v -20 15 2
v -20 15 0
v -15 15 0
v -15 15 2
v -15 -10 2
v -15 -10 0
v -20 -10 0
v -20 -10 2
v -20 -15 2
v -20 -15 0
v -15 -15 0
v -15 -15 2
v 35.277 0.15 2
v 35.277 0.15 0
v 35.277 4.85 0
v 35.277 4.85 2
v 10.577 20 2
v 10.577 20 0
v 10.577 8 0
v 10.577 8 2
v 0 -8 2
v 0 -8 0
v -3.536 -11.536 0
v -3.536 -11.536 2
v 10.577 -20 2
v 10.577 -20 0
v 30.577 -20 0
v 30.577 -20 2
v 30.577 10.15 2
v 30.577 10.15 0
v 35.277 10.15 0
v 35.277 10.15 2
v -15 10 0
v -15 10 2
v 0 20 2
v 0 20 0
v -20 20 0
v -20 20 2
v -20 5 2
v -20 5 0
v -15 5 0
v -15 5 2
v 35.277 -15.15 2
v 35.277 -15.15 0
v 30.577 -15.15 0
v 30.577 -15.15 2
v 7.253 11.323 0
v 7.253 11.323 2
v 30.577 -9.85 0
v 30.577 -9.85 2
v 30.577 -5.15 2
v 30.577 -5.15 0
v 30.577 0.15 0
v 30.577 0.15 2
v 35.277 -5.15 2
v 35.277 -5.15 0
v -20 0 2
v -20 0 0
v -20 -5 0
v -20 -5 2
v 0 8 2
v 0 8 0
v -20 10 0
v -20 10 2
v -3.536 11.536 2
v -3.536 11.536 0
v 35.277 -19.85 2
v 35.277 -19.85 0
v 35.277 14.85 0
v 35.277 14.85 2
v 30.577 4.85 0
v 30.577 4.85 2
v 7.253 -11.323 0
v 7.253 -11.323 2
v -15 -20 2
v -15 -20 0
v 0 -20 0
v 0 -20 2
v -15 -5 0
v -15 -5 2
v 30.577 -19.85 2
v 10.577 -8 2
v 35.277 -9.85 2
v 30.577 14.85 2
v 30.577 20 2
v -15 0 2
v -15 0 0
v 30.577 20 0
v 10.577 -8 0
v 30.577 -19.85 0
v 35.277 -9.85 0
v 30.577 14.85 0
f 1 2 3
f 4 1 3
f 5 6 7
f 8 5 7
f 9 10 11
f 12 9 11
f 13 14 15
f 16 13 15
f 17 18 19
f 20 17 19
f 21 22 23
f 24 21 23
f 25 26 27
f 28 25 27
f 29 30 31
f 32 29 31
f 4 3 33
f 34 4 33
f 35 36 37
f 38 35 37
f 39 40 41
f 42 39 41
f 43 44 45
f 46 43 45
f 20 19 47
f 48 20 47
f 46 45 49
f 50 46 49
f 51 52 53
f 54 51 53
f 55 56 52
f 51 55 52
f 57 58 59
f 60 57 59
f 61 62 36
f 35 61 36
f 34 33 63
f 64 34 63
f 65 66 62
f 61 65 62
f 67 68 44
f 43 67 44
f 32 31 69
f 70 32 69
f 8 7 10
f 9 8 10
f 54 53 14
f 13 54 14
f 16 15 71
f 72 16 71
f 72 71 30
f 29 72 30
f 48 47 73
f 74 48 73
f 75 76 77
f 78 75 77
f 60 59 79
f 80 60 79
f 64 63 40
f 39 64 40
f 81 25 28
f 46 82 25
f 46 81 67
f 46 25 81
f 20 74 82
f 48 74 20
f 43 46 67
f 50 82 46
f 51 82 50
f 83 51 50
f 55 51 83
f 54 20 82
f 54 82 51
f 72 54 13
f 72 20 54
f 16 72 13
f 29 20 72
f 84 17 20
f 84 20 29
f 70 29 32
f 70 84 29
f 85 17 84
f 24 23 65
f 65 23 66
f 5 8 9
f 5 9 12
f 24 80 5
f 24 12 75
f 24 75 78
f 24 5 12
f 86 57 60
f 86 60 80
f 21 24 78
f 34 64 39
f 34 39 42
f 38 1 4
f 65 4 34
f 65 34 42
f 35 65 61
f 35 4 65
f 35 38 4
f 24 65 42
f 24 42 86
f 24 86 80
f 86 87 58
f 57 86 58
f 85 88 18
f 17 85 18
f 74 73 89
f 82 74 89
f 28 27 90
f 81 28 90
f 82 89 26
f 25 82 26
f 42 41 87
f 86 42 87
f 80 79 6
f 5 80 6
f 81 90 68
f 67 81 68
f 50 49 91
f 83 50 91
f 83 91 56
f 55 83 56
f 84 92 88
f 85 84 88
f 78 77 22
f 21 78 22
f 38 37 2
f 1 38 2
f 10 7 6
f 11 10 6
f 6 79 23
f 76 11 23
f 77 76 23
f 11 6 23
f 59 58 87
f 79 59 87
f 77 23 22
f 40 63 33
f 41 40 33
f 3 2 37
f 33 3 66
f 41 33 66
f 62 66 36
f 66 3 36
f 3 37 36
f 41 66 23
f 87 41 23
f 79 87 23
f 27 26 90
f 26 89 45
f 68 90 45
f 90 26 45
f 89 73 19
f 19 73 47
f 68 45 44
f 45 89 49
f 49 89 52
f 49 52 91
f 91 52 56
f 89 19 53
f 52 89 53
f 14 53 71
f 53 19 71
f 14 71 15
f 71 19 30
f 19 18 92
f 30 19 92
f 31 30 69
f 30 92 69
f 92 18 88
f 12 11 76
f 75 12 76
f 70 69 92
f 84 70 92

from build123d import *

# Parameters (mm, degrees)
F1_DEPTH = 2


with BuildPart() as f1:
    # F0 (on Top) → F1 (new body)
    with BuildSketch(Plane.XY):
        Polygon((30.576707, 20), (10.576707, 20), (10.576707, 8), (7.253306, 11.323402), (7.253306, -11.323402), (10.576707, -8), (10.576707, -20), (30.576707, -20), (30.576707, -19.85), (35.276707, -19.85), (35.276707, -15.15), (30.576707, -15.15), (30.576707, -9.85), (35.276707, -9.85), (35.276707, -5.15), (30.576707, -5.15), (30.576707, 0.15), (35.276707, 0.15), (35.276707, 4.85), (30.576707, 4.85), (30.576707, 10.15), (35.276707, 10.15), (35.276707, 14.85), (30.576707, 14.85), align=None)
        Polygon((0, 8), (0, 20), (-20, 20), (-20, 15), (-15, 15), (-15, 10), (-20, 10), (-20, 5), (-15, 5), (-15, 0), (-20, 0), (-20, -5), (-15, -5), (-15, -10), (-20, -10), (-20, -15), (-15, -15), (-15, -20), (0, -20), (0, -8), (-3.535534, -11.535534), (-3.535534, 11.535534), align=None)
    extrude(amount=F1_DEPTH)


solid = f1.part
